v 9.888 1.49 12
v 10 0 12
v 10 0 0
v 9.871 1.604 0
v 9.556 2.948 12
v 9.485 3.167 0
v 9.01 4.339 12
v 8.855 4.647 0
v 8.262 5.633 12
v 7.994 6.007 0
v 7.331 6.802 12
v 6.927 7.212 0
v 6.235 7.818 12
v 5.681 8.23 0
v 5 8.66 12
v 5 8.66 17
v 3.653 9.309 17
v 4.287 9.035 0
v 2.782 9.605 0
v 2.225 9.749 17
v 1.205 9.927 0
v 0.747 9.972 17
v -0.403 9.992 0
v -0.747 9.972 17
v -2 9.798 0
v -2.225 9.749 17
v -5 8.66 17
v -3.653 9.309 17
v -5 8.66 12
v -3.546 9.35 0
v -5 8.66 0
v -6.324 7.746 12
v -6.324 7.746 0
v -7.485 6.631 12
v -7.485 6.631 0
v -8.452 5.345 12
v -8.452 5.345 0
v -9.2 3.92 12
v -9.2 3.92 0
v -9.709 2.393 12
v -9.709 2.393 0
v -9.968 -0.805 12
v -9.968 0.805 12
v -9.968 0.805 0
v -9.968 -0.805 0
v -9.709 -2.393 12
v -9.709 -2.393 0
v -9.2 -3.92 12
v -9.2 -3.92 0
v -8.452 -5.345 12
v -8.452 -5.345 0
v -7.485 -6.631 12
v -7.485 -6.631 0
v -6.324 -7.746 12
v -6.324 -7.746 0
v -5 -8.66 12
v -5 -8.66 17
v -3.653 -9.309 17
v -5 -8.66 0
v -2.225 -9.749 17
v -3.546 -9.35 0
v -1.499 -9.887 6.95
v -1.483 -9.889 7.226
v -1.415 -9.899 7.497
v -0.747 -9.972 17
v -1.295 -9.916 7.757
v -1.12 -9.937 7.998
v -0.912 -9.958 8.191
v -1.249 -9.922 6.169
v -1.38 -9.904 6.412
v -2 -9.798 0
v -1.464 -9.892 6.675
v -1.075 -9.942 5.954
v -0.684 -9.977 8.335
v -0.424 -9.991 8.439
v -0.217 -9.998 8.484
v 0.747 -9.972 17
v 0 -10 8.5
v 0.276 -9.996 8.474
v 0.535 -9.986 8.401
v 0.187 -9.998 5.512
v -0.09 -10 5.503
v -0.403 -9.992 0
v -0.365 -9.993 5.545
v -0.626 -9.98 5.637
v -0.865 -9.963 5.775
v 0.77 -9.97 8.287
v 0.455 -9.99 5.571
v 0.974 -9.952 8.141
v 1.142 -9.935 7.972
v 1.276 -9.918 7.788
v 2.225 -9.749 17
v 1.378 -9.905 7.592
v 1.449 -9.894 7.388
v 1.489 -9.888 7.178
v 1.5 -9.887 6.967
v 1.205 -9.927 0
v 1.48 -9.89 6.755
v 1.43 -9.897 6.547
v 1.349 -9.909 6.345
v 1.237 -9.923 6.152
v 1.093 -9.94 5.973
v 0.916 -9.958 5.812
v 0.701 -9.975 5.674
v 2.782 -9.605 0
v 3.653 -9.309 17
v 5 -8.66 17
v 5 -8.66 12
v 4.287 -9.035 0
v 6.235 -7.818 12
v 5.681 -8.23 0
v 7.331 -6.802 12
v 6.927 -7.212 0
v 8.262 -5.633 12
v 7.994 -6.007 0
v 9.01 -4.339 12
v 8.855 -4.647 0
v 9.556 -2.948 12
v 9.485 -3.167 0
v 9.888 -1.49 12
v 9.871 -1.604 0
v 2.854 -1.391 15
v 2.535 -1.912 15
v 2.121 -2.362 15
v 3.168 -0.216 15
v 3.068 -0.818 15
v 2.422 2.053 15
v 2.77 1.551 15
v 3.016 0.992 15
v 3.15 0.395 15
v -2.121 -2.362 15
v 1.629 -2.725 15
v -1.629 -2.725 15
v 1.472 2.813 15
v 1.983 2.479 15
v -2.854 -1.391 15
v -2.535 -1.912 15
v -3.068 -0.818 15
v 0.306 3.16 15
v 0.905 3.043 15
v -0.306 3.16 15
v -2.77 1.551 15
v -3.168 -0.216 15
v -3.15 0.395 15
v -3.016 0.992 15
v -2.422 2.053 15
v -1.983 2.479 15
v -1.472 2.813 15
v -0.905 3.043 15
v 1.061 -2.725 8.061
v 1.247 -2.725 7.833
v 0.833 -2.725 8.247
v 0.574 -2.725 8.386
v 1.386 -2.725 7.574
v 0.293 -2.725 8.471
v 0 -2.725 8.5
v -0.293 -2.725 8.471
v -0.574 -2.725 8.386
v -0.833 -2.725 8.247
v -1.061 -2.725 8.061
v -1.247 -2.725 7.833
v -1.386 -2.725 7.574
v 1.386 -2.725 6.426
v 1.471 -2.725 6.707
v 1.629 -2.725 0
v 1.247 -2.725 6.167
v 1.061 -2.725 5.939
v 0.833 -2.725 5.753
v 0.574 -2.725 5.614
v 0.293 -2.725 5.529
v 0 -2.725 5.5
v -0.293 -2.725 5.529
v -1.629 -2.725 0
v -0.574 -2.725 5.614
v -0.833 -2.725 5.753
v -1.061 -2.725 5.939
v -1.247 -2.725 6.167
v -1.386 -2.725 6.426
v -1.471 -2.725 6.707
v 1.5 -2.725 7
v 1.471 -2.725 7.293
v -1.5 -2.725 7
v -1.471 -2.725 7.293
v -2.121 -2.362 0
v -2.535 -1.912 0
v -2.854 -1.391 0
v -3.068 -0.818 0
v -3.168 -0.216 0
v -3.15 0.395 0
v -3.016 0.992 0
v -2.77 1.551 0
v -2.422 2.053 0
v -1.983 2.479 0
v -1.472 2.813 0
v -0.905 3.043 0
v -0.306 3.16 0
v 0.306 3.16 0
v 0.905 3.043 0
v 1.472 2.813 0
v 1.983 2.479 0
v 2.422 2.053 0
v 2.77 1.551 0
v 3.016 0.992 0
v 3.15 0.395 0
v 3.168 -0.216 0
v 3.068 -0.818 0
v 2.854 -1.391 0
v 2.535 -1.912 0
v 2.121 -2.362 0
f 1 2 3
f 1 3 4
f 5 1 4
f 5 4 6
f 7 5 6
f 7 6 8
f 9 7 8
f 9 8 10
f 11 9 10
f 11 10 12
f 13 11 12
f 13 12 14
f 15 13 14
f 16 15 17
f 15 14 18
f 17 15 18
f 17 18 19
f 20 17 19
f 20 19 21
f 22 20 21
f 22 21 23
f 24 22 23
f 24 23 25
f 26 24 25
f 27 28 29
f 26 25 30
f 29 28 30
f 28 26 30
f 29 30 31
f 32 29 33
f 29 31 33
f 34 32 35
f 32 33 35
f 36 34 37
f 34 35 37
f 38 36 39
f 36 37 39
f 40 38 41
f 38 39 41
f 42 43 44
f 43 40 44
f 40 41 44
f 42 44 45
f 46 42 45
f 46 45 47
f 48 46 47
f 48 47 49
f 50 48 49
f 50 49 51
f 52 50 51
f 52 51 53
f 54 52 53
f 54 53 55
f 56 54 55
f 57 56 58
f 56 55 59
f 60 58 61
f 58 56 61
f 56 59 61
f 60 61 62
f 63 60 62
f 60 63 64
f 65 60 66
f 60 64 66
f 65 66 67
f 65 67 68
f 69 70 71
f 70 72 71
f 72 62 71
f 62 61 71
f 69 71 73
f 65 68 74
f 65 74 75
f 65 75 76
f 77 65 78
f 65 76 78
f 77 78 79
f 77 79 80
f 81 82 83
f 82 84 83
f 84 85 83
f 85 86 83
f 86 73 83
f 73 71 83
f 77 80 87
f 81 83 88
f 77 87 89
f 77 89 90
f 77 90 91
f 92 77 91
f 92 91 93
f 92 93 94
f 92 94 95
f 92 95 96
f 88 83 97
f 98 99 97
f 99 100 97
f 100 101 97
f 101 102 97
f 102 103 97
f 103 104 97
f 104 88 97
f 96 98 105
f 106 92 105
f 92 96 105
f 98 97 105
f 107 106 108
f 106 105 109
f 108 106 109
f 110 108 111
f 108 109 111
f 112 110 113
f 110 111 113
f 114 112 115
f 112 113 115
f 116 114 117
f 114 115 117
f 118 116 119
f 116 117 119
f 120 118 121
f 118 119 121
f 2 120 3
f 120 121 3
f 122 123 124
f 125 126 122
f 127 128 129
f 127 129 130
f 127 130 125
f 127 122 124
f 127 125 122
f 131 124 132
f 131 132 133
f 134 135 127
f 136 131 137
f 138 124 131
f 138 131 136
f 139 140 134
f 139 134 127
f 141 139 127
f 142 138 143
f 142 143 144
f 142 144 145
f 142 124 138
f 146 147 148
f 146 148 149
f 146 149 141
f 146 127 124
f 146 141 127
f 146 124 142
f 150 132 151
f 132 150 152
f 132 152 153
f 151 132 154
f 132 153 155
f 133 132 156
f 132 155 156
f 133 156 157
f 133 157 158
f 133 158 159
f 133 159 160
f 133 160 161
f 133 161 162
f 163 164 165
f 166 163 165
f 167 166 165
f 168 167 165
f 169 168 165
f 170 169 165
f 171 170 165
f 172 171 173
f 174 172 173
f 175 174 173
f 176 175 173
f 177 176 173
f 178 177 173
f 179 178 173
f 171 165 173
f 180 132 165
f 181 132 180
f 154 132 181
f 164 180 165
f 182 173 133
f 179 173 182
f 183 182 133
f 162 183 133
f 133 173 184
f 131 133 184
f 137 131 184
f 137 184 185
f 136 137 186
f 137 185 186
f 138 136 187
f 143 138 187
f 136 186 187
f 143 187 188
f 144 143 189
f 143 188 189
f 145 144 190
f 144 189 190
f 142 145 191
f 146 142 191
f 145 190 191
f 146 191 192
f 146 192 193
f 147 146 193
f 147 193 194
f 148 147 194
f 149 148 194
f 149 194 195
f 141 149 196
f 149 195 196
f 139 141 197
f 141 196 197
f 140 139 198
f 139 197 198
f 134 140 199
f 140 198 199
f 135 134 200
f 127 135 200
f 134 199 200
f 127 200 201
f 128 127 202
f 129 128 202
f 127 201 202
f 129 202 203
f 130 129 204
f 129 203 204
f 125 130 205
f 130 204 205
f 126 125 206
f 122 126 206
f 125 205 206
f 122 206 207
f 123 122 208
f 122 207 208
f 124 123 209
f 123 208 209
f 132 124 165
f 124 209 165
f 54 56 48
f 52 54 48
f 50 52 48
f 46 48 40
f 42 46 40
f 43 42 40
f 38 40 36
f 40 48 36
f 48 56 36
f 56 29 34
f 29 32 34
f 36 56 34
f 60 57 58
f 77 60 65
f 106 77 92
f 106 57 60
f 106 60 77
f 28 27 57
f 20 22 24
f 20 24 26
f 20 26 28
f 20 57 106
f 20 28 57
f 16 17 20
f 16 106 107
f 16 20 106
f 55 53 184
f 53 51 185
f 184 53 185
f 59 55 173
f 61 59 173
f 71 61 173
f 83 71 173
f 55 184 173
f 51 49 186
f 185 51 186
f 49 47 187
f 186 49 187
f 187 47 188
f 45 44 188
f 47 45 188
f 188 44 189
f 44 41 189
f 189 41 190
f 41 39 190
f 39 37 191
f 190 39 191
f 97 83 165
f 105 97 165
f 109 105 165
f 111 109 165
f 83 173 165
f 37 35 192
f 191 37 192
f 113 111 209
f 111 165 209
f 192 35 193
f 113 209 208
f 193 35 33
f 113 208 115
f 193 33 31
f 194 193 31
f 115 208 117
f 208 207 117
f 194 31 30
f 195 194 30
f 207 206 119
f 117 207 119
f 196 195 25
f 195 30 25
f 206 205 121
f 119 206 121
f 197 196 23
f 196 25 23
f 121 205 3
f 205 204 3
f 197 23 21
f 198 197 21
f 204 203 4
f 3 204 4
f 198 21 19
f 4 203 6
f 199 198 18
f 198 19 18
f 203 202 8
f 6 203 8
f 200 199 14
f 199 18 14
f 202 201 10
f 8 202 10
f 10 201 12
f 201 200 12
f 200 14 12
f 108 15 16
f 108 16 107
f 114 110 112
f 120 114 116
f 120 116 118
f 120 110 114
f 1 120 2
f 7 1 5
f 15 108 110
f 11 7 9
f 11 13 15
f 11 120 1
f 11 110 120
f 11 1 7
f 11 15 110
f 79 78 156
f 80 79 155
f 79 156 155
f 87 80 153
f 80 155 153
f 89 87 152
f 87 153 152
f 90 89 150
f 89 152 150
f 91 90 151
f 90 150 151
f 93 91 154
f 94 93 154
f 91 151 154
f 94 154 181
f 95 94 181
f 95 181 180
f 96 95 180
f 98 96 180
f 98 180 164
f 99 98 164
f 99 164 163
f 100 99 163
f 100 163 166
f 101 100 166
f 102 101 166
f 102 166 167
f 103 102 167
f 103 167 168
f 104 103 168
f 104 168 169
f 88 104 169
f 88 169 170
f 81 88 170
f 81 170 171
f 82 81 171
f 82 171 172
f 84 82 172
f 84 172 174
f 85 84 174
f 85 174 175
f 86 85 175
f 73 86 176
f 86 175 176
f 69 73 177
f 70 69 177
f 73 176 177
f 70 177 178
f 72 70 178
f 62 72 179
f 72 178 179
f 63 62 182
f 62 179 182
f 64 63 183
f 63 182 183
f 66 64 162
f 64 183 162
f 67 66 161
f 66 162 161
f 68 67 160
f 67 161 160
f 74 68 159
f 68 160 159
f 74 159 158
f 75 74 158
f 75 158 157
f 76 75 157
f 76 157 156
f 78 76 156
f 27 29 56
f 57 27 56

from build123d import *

# Parameters (mm, degrees)
ESBO_O1_R                  = 10
RESSALTO_EXTRUS_O1_DEPTH   = 17
CORTE_EXTRUS_O1_START      = -5
CORTE_EXTRUS_O1_DEPTH      = 5
CORTE_EXTRUS_O2_DEPTH      = 15
CORTE_EXTRUS_O3_REACH      = 25.472
CORTE_EXTRUS_O3_END_RADIUS = 10
ESBO_O4_R                  = 1.5


with BuildPart() as part:
    # Esboço1 → Ressalto-extrusão1 (new body)
    with BuildSketch(Plane.XY):
        Circle(ESBO_O1_R)
    extrude(amount=RESSALTO_EXTRUS_O1_DEPTH)

    # Esboço2 → Corte-extrusão1 (cut)
    with BuildSketch(Plane.XY.offset(17).offset(CORTE_EXTRUS_O1_START)):
        with BuildLine():
            Line((-5, 8.660254038), (-5, -8.660254038))
            ThreePointArc((-5, -8.660254038), (-10, 0), (-5, 8.660254038))
        make_face()
        with BuildLine():
            Line((5, 8.660254038), (5, -8.660254038))
            ThreePointArc((5, -8.660254038), (10, 0), (5, 8.660254038))
        make_face()
    extrude(amount=CORTE_EXTRUS_O1_DEPTH, mode=Mode.SUBTRACT)

    # Esboço3 → Corte-extrusão2 (cut)
    with BuildSketch(Plane(origin=(0, 0, 0), x_dir=(-1, 0, 0), z_dir=(0, 0, -1))):
        with BuildLine():
            Line((0, -2.725), (1.629417074, -2.725))
            ThreePointArc((1.629417074, -2.725), (0, 3.175), (-1.629417074, -2.725))
            Line((-1.629417074, -2.725), (0, -2.725))
        make_face()
    extrude(amount=-CORTE_EXTRUS_O2_DEPTH, mode=Mode.SUBTRACT)

    # Corte-extrusão3: up to this cylinder (the profile starts inside it)
    corte_extrus_o3_end = Plane(origin=(0, 0, 7), z_dir=(0, 0, -1)) * Cylinder(CORTE_EXTRUS_O3_END_RADIUS, 71.944, mode=Mode.PRIVATE)
    # Esboço4 → Corte-extrusão3 (cut, up to the surface)
    with BuildSketch(Plane(origin=(0, -2.725, 0), x_dir=(1, 0, 0), z_dir=(0, 1, 0)), mode=Mode.PRIVATE) as corte_extrus_o3_sk1:
        with Locations(Location((0, -7, 0), (0, 0, 270))):
            Circle(ESBO_O4_R)
    corte_extrus_o3_tool1 = extrude(corte_extrus_o3_sk1.sketch, amount=-CORTE_EXTRUS_O3_REACH, mode=Mode.PRIVATE) & corte_extrus_o3_end
    add(corte_extrus_o3_tool1.solids().sort_by_distance((0, -2.725, 7))[0], mode=Mode.SUBTRACT)


solid = part.part
